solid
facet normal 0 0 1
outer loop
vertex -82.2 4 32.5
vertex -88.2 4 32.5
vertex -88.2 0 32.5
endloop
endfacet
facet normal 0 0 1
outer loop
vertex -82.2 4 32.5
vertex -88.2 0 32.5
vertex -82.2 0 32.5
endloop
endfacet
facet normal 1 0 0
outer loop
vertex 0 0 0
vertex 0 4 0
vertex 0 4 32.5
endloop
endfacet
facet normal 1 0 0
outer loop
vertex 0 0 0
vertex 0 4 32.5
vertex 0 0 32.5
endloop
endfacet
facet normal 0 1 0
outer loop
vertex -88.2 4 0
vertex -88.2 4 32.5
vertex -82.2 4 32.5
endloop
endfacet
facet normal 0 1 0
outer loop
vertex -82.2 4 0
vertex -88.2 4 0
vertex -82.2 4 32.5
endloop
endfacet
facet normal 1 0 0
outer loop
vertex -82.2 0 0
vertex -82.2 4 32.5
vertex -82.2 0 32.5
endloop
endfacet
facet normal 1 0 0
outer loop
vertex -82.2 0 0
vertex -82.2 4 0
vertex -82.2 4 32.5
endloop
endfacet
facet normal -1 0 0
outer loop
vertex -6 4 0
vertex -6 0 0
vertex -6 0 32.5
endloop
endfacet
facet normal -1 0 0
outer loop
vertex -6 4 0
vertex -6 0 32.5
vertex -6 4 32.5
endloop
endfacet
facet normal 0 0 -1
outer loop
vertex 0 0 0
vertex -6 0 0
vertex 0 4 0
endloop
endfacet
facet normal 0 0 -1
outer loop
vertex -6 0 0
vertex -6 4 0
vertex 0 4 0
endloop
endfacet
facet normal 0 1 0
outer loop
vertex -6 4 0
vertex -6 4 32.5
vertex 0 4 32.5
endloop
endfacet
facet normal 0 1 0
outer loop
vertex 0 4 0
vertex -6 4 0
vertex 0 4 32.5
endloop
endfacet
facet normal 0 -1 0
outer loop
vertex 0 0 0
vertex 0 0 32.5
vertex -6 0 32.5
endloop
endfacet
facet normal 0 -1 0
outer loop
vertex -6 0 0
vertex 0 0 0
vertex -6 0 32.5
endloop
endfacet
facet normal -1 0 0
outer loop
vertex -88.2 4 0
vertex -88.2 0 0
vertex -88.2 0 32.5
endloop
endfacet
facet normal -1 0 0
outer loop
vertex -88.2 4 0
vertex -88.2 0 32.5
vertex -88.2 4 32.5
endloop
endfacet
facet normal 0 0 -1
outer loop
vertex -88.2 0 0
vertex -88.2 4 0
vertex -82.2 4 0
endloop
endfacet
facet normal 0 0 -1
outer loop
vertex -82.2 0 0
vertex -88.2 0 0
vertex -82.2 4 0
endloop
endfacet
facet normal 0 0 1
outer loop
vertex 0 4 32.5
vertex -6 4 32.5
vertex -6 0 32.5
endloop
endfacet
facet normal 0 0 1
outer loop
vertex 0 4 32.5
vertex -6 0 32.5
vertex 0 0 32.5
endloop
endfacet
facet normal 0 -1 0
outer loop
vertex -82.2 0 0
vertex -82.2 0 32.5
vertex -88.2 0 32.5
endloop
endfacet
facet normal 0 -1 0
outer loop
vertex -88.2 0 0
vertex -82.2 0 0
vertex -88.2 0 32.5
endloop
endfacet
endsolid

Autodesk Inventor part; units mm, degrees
ref_plane "YZ Plane" through (0, 0, 0) normal (1, 0, 0) x (0, 1, 0)
ref_plane "XZ Plane" through (0, 0, 0) normal (0, 1, 0) x (-1, 0, 0)
ref_plane "Work Plane1" through (0, 0, 0) normal (0, 0, 1) x (1, 0, 0)
sketch "Sketch1" plane through (0, 0, 0) normal (0, 0, 1) x (1, 0, 0)
  line L0 (-9.5, 4) -> (-78.7, 4) construction
  line L1 (0, 0) -> (-88.2, 0) construction
  line L2 (-88.2, 0) -> (-88.2, 10) construction
  line L3 (-88.2, 4) -> (-82.2, 4)
  line L4 (-82.2, 4) -> (-82.2, 0)
  line L5 (-82.2, 0) -> (-88.2, 0)
  line L6 (-88.2, 0) -> (-88.2, 4)
  line L7 (-6, 4) -> (0, 4)
  line L8 (0, 4) -> (0, 0)
  line L9 (0, 0) -> (-6, 0)
  line L10 (-6, 0) -> (-6, 4)
  line L11 (0, 0) -> (0, 10) construction
  dimension "d0" = 6
  dimension "d1" = 6
  dimension "d2" = 0
  dimension "d3" = 0
ref_plane "Work Plane2" through (-88.2, 0, 32.5) normal (0, 0, -1) x (0, 1, 0)
extrude "Extrusion1" add sketch "Sketch1" along normal up to surface (32.5 mm away)
properties part number "CrossBeam2"
